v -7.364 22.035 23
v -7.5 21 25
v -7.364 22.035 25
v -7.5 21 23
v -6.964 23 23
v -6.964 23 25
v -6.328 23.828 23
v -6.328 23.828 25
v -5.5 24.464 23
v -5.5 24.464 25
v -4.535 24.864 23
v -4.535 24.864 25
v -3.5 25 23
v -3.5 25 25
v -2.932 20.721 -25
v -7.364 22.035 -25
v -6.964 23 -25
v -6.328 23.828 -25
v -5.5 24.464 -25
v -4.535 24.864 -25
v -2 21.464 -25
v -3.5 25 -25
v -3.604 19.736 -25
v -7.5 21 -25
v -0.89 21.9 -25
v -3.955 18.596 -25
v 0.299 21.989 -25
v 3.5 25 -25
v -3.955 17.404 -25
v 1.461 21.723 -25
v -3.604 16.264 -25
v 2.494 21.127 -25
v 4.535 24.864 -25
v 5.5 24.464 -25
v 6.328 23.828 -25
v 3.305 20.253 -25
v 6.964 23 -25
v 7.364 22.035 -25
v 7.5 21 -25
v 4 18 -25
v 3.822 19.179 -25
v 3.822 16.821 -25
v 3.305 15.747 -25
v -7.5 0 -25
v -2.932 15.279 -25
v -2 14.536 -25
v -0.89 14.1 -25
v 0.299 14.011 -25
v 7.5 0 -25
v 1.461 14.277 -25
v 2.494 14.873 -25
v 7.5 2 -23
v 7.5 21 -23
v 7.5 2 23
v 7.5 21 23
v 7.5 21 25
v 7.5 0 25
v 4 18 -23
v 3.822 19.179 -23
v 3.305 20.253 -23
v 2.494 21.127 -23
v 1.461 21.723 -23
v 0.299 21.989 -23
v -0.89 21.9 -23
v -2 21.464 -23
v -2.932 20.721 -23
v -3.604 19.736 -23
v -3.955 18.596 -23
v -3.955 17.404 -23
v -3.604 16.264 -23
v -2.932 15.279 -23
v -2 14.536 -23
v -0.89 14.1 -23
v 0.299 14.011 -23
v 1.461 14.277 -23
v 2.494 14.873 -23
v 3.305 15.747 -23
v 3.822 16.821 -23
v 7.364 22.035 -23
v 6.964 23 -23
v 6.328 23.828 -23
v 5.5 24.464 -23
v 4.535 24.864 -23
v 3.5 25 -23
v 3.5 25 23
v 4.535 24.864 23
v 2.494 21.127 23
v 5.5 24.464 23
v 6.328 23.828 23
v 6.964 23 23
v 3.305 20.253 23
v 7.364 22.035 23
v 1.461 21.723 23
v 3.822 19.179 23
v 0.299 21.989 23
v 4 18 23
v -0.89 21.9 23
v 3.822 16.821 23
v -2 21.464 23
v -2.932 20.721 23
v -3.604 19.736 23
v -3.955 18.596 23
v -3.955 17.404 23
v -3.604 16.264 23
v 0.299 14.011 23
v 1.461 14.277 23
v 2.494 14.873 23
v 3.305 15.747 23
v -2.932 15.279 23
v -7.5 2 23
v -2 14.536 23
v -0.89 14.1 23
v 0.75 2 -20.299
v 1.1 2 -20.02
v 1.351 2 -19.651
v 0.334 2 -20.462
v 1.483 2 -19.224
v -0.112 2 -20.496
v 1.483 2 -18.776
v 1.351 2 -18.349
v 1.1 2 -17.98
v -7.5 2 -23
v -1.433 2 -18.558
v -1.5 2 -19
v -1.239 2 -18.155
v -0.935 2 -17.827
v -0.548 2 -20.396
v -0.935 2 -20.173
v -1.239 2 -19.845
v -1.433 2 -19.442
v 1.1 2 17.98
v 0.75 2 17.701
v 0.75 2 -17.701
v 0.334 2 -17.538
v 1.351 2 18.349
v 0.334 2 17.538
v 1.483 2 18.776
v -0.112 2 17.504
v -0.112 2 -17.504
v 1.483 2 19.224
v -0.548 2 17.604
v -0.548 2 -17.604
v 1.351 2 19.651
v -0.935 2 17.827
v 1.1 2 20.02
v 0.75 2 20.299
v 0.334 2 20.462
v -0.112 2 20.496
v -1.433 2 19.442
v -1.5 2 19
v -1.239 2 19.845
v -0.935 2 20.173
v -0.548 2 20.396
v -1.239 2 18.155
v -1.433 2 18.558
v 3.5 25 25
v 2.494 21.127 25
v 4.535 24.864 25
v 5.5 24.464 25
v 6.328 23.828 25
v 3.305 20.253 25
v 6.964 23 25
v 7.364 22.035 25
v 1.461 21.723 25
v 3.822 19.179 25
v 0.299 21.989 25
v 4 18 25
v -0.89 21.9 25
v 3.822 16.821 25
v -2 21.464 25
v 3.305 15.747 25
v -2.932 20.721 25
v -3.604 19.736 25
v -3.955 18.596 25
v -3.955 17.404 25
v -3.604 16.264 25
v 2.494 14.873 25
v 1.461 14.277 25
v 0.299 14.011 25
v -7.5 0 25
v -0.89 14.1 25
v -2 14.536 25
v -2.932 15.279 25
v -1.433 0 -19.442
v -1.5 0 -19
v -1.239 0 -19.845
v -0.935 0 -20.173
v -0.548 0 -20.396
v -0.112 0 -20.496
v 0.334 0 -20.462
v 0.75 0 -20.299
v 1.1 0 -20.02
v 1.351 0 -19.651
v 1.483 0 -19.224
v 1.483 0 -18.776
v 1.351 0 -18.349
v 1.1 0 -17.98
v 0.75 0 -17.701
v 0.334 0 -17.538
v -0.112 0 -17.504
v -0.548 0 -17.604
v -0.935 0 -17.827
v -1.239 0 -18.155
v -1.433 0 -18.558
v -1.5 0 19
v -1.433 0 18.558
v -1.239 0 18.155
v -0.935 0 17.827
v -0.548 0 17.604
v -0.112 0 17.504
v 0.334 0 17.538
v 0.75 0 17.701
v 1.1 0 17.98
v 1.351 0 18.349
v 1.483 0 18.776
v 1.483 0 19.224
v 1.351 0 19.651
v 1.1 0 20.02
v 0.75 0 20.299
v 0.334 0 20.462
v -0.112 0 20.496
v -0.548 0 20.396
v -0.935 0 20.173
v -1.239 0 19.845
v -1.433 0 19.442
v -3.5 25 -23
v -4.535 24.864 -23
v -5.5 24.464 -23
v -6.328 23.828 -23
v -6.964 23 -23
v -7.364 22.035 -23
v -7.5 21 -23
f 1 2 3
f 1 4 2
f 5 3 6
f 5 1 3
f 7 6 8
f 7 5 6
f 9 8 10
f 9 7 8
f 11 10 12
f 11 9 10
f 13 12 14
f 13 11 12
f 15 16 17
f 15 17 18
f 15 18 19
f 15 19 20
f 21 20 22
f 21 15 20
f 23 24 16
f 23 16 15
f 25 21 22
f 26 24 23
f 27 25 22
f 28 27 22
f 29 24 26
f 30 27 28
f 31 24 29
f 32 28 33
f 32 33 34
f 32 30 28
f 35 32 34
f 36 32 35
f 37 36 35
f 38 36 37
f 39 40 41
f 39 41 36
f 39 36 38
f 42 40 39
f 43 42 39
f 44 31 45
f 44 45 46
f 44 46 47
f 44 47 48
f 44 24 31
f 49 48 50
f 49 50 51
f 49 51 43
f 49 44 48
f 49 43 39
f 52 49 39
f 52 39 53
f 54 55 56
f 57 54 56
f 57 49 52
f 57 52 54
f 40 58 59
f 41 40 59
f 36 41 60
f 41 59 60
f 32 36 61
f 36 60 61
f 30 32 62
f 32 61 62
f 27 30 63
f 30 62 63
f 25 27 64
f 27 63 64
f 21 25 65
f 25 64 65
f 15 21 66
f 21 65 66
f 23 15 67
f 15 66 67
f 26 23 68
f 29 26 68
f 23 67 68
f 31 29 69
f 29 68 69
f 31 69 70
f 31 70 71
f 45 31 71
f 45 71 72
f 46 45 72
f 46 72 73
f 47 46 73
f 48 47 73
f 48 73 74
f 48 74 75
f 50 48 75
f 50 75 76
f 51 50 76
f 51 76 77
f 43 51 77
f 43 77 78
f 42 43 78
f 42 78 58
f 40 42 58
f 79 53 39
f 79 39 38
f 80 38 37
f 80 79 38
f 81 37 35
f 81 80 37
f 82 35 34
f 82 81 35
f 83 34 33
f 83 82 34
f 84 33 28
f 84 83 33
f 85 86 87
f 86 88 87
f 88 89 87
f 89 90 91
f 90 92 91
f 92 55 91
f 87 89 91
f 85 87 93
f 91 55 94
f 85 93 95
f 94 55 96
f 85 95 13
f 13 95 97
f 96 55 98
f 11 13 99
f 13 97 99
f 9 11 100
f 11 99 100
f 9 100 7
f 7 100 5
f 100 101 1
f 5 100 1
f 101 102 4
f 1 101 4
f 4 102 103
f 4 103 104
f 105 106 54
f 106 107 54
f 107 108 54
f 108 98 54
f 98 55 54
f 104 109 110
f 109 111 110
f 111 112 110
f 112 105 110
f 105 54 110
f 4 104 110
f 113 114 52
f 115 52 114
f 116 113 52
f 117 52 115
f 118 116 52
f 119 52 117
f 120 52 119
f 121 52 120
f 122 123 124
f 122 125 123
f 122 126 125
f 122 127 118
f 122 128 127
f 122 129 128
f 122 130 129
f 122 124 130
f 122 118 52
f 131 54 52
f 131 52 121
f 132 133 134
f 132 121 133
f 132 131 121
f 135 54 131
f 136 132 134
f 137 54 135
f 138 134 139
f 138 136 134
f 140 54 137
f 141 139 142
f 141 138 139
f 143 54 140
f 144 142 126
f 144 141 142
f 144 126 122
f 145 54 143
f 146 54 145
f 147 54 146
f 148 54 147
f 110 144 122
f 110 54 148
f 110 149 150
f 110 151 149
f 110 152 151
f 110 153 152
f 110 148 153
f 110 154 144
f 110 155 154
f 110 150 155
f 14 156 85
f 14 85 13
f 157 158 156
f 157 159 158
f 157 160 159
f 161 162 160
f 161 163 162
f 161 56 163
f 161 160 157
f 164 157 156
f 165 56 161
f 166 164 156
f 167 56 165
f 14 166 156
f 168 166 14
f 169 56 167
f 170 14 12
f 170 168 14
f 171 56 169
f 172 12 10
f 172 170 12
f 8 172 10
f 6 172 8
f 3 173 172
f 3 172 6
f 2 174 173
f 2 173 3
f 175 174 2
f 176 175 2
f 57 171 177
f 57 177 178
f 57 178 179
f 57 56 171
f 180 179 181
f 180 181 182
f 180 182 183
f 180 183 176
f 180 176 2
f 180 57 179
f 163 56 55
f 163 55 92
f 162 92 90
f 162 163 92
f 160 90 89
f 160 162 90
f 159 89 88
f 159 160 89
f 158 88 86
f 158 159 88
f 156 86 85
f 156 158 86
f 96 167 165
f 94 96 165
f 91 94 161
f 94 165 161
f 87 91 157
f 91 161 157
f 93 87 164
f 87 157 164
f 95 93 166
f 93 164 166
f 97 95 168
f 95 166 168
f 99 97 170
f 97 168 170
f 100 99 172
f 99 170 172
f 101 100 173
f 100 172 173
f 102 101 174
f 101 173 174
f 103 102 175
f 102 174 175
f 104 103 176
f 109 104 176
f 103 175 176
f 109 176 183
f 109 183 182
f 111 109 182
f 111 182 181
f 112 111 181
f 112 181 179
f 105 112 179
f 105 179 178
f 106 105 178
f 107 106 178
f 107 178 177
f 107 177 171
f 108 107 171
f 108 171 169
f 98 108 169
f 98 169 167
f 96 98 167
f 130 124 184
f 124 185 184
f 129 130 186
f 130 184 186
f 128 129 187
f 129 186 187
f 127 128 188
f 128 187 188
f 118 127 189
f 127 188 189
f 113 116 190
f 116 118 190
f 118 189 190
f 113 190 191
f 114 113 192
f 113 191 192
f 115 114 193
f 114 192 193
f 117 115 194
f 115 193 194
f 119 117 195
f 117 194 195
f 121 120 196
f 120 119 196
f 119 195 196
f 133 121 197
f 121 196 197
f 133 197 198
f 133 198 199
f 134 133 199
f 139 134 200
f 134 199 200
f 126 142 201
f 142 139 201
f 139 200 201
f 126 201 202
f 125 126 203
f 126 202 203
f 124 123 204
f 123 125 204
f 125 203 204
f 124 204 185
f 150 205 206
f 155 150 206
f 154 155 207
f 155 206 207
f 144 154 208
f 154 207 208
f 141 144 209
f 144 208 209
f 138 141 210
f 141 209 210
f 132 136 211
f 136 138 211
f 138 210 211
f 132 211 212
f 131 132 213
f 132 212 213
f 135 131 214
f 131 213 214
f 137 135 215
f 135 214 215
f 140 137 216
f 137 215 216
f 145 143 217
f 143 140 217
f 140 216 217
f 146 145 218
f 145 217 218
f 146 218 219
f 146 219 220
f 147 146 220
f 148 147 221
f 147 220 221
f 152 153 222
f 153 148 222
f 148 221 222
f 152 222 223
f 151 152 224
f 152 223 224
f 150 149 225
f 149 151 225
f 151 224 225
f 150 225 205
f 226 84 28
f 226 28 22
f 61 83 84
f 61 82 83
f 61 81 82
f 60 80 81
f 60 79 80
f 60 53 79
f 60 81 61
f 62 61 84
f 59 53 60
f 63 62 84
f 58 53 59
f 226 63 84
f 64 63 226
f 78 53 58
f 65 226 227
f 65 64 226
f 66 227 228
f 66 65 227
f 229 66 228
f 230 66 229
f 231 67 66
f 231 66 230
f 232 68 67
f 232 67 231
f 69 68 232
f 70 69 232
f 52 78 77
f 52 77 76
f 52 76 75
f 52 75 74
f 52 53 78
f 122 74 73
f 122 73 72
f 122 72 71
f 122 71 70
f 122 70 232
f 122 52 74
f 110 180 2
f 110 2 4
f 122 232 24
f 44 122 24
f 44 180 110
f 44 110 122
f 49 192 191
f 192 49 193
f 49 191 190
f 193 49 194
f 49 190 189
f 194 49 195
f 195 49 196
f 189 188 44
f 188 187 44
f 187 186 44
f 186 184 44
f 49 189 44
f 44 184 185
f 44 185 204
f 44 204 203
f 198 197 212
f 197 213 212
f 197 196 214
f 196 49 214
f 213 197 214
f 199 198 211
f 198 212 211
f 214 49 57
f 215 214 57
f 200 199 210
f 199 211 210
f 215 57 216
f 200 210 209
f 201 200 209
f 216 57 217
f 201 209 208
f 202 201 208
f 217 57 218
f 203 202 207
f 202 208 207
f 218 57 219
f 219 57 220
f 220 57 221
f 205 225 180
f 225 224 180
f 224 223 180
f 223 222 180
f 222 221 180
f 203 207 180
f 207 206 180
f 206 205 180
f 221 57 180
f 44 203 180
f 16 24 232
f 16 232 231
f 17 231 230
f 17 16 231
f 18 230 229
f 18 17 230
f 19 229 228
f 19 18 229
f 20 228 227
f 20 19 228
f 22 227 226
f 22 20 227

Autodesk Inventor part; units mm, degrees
ref_plane "YZ Plane" through (0, 0, 0) normal (1, 0, 0) x (0, 1, 0)
ref_plane "XZ Plane" through (0, 0, 0) normal (0, 1, 0) x (-1, 0, 0)
ref_plane "XY Plane" through (0, 0, 0) normal (0, 0, 1) x (1, 0, 0)
sketch "Sketch1" plane through (0, 0, 0) normal (0, 1, 0) x (-1, 0, 0)
  line L0 (-7.5, 25) -> (7.5, 25)
  line L1 (7.5, 25) -> (7.5, -25)
  line L2 (7.5, -25) -> (-7.5, -25)
  line L3 (-7.5, -25) -> (-7.5, 25)
  line L4 (-7.5, 25) -> (7.5, -25) construction
  line L5 (7.5, 25) -> (-7.5, -25) construction
  line L6 (0.5, -19) -> (-0.5, -19)
  line L7 (-0.5, 19) -> (0.5, 19)
  circle A0 centre (0, 19) radius 1.5
  circle A1 centre (0, -19) radius 1.5
  line L8 (7.5, -25) -> (-7.5, -25)
  line L9 (-7.5, -25) -> (-7.5, -23)
  line L10 (-7.5, -23) -> (7.5, -23)
  line L11 (7.5, -23) -> (7.5, -25)
  line L12 (7.5, 25) -> (-7.5, 25)
  line L13 (-7.5, 25) -> (-7.5, 23)
  line L14 (-7.5, 23) -> (7.5, 23)
  line L15 (7.5, 23) -> (7.5, 25)
  point P0 (0, 0)
  point P1 (0, 0)
  dimension "d0" = 15
  dimension "d1" = 50
  dimension "d2" = 1
  dimension "d3" = 38
  dimension "d4" = 3
  dimension "d5" = 3
  dimension "d6" = 15
  dimension "d7" = 2
  dimension "d8" = 15
  dimension "d9" = 2
extrude "Extrusion1" add sketch "Sketch1" along normal blind 2 contours L14 L1 L10 L3
extrude "Extrusion2" add sketch "Sketch1" along normal blind 25 contours L0 L1 L14 L3 | L10 L1 L2 L3
sketch "Sketch2" plane through (-7.5, 0, 25) normal (0, 0, 1) x (1, 0, 0)
  line L0 (7.5, 0) -> (7.5, 18)
  line L1 (7.5, 0) -> (25.5, 0) construction
  circle A0 centre (7.5, 18) radius 4
  dimension "d14" = 18
  dimension "d15" = 90
  dimension "d16" = 8
extrude "Extrusion3" cut sketch "Sketch2" against normal blind 50
fillet "Fillet1" radius 4 4 edges at (-7.5, 25, -24) (7.5, 25, -24) (-7.5, 25, 24) (7.5, 25, 24)
properties part number "senzor_drzak"
